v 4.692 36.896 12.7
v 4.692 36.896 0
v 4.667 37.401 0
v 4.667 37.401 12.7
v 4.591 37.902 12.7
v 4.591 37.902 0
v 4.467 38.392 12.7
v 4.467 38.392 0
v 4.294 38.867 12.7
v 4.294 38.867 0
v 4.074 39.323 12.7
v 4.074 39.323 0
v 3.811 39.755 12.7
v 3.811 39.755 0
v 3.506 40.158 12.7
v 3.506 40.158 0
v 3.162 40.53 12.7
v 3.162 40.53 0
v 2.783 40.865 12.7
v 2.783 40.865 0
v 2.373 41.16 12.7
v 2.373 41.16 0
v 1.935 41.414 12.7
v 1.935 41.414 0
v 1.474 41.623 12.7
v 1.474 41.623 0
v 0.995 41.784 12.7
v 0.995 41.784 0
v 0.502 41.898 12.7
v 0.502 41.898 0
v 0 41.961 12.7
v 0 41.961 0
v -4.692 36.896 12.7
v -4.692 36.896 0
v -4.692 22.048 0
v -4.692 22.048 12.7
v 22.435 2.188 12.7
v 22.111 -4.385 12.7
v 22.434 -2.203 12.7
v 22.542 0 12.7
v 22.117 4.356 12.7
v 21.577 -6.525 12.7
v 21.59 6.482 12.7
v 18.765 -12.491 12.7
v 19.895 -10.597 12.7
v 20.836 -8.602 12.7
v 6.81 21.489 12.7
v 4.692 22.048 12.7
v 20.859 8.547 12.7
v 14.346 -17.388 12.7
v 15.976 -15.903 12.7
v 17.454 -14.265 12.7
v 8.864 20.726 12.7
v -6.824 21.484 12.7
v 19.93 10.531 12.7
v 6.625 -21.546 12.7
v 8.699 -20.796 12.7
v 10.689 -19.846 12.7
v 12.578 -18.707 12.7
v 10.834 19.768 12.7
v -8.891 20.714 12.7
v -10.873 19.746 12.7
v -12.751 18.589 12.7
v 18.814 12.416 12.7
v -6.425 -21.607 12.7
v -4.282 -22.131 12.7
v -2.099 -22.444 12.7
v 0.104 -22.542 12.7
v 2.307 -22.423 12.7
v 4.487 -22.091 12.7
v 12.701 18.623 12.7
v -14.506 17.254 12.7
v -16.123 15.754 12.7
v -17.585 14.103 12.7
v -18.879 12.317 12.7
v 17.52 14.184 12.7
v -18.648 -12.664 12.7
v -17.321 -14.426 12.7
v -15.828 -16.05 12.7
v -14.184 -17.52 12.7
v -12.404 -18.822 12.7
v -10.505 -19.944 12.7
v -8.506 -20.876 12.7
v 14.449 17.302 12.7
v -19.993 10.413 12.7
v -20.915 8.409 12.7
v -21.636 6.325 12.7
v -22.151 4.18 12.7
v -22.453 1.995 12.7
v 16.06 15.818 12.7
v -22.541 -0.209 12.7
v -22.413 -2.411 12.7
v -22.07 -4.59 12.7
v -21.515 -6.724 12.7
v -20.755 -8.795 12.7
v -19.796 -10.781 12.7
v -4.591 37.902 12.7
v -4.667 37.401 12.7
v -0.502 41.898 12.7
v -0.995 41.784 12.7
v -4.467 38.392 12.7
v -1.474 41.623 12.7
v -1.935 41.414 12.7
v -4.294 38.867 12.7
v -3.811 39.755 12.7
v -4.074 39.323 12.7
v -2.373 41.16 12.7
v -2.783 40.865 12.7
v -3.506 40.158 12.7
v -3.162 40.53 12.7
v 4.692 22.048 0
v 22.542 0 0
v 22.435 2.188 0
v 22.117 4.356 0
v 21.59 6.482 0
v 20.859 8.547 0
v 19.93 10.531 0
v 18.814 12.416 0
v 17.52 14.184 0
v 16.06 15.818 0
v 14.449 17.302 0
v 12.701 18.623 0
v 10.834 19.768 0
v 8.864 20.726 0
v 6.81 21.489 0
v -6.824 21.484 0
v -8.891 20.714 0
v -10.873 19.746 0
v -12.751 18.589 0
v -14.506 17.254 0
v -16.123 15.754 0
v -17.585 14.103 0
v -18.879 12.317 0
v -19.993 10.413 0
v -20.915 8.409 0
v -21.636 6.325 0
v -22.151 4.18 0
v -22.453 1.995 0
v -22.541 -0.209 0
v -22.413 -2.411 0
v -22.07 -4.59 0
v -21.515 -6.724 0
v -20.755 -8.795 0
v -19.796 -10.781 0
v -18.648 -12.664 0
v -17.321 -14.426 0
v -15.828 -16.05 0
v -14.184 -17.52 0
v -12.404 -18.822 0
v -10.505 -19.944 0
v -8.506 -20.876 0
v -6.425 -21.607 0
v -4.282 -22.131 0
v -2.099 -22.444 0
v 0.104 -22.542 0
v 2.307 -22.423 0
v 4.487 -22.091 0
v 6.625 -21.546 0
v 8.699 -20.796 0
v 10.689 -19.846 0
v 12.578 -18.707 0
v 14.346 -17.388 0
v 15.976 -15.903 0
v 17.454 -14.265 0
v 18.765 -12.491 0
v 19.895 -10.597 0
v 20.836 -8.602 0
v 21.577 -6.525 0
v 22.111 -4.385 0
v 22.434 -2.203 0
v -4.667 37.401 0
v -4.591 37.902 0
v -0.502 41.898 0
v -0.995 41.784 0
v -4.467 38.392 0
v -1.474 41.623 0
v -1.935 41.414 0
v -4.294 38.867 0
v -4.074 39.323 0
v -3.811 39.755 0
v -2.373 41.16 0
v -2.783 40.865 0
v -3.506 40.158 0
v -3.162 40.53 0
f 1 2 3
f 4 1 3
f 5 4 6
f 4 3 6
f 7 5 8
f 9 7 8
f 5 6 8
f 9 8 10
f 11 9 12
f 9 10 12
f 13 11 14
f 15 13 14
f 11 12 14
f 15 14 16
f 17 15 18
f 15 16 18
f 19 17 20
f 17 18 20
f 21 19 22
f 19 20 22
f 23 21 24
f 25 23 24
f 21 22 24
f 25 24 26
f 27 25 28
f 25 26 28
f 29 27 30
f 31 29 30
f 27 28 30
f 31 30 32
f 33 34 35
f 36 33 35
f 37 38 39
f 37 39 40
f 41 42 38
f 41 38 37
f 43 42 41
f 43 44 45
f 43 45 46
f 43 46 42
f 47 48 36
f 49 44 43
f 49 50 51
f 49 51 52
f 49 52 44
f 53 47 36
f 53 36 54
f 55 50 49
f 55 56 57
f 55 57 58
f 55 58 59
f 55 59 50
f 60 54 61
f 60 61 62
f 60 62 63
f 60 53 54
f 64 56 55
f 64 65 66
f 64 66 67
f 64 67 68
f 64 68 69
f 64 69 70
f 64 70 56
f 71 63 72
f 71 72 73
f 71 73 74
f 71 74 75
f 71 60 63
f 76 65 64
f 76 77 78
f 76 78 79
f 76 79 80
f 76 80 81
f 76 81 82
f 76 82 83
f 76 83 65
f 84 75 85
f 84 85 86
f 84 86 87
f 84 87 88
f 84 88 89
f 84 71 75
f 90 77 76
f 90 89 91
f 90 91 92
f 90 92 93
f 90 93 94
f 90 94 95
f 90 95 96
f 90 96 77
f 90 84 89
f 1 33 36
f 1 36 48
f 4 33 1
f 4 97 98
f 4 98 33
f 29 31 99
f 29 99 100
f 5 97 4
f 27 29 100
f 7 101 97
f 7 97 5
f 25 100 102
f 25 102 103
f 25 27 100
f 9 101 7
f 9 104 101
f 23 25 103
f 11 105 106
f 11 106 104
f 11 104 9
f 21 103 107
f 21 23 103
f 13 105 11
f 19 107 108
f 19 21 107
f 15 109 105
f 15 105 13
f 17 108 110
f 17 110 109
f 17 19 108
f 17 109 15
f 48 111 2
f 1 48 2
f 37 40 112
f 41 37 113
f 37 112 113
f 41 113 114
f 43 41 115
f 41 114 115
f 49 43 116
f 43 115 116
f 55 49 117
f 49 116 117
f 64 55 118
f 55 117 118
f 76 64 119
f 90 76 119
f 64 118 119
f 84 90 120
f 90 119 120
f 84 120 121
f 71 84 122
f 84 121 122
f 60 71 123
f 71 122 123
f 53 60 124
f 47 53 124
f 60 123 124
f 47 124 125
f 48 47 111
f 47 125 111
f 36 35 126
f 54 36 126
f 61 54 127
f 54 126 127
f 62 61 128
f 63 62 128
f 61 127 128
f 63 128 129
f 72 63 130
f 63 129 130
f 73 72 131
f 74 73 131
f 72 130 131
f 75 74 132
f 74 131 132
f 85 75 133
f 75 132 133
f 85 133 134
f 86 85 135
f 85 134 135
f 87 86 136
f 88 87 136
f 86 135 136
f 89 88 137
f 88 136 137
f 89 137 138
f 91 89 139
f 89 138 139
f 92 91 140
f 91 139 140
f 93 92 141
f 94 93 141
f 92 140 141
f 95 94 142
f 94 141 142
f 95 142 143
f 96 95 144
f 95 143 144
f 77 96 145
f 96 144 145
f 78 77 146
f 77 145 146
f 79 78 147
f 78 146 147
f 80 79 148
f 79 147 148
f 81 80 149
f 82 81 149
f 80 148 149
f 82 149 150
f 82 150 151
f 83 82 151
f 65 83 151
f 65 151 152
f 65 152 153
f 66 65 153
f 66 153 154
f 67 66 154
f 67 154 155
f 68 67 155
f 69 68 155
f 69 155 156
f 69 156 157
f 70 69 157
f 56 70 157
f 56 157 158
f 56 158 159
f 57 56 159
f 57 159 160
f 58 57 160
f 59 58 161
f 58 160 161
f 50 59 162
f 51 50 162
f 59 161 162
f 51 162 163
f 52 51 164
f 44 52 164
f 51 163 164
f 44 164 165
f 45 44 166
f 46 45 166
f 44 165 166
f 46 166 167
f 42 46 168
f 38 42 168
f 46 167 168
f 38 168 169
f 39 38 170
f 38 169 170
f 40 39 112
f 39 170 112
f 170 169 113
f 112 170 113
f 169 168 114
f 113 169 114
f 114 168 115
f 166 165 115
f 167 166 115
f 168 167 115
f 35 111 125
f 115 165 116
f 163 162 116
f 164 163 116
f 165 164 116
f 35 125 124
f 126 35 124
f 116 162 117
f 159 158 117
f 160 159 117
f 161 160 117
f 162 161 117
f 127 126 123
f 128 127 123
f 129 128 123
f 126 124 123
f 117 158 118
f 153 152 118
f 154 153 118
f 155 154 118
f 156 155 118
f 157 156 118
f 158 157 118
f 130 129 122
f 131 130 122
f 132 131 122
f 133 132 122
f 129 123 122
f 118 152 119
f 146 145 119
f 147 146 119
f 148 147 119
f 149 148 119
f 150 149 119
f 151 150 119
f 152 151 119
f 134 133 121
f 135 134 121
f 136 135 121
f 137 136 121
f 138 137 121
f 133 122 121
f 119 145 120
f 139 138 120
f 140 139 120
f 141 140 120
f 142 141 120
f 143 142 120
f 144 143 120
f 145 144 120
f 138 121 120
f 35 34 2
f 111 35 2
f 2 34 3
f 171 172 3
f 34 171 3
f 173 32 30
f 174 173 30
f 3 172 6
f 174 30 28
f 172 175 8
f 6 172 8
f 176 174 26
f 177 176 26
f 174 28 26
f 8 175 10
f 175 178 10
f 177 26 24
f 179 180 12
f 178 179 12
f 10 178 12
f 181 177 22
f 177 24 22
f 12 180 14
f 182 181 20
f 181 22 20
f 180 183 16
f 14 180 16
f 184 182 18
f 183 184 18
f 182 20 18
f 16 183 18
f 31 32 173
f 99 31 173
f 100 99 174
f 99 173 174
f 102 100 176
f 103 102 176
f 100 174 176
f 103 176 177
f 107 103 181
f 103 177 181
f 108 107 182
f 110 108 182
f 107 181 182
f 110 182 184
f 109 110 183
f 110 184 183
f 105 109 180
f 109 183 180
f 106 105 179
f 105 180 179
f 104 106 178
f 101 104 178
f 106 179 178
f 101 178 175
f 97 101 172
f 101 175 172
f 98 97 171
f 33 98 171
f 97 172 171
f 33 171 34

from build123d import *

# Parameters (mm, degrees)
F1_DEPTH = 12.7


with BuildPart() as f1:
    # F0 (on Top) → F1 (new body)
    with BuildSketch(Plane.XY):
        with BuildLine():
            ThreePointArc((-4.691688, 22.048172), (0, 22.541824), (4.691688, 22.048172))
            Line((4.691688, 22.048172), (4.691688, 36.896243))
            ThreePointArc((4.691688, 36.896243), (3.338552, 40.348328), (0, 41.96138))
            ThreePointArc((0, 41.96138), (-3.338552, 40.348328), (-4.691688, 36.896243))
            Line((-4.691688, 36.896243), (-4.691688, 22.048172))
        make_face()
        with BuildLine():
            ThreePointArc((-4.691688, 22.048172), (-14.184051, -17.519889), (22.541824, 0))
            ThreePointArc((22.541824, 0), (17.519889, 14.184051), (4.691688, 22.048172))
            ThreePointArc((4.691688, 22.048172), (0, 22.541824), (-4.691688, 22.048172))
        make_face()
    extrude(amount=F1_DEPTH)


solid = f1.part
